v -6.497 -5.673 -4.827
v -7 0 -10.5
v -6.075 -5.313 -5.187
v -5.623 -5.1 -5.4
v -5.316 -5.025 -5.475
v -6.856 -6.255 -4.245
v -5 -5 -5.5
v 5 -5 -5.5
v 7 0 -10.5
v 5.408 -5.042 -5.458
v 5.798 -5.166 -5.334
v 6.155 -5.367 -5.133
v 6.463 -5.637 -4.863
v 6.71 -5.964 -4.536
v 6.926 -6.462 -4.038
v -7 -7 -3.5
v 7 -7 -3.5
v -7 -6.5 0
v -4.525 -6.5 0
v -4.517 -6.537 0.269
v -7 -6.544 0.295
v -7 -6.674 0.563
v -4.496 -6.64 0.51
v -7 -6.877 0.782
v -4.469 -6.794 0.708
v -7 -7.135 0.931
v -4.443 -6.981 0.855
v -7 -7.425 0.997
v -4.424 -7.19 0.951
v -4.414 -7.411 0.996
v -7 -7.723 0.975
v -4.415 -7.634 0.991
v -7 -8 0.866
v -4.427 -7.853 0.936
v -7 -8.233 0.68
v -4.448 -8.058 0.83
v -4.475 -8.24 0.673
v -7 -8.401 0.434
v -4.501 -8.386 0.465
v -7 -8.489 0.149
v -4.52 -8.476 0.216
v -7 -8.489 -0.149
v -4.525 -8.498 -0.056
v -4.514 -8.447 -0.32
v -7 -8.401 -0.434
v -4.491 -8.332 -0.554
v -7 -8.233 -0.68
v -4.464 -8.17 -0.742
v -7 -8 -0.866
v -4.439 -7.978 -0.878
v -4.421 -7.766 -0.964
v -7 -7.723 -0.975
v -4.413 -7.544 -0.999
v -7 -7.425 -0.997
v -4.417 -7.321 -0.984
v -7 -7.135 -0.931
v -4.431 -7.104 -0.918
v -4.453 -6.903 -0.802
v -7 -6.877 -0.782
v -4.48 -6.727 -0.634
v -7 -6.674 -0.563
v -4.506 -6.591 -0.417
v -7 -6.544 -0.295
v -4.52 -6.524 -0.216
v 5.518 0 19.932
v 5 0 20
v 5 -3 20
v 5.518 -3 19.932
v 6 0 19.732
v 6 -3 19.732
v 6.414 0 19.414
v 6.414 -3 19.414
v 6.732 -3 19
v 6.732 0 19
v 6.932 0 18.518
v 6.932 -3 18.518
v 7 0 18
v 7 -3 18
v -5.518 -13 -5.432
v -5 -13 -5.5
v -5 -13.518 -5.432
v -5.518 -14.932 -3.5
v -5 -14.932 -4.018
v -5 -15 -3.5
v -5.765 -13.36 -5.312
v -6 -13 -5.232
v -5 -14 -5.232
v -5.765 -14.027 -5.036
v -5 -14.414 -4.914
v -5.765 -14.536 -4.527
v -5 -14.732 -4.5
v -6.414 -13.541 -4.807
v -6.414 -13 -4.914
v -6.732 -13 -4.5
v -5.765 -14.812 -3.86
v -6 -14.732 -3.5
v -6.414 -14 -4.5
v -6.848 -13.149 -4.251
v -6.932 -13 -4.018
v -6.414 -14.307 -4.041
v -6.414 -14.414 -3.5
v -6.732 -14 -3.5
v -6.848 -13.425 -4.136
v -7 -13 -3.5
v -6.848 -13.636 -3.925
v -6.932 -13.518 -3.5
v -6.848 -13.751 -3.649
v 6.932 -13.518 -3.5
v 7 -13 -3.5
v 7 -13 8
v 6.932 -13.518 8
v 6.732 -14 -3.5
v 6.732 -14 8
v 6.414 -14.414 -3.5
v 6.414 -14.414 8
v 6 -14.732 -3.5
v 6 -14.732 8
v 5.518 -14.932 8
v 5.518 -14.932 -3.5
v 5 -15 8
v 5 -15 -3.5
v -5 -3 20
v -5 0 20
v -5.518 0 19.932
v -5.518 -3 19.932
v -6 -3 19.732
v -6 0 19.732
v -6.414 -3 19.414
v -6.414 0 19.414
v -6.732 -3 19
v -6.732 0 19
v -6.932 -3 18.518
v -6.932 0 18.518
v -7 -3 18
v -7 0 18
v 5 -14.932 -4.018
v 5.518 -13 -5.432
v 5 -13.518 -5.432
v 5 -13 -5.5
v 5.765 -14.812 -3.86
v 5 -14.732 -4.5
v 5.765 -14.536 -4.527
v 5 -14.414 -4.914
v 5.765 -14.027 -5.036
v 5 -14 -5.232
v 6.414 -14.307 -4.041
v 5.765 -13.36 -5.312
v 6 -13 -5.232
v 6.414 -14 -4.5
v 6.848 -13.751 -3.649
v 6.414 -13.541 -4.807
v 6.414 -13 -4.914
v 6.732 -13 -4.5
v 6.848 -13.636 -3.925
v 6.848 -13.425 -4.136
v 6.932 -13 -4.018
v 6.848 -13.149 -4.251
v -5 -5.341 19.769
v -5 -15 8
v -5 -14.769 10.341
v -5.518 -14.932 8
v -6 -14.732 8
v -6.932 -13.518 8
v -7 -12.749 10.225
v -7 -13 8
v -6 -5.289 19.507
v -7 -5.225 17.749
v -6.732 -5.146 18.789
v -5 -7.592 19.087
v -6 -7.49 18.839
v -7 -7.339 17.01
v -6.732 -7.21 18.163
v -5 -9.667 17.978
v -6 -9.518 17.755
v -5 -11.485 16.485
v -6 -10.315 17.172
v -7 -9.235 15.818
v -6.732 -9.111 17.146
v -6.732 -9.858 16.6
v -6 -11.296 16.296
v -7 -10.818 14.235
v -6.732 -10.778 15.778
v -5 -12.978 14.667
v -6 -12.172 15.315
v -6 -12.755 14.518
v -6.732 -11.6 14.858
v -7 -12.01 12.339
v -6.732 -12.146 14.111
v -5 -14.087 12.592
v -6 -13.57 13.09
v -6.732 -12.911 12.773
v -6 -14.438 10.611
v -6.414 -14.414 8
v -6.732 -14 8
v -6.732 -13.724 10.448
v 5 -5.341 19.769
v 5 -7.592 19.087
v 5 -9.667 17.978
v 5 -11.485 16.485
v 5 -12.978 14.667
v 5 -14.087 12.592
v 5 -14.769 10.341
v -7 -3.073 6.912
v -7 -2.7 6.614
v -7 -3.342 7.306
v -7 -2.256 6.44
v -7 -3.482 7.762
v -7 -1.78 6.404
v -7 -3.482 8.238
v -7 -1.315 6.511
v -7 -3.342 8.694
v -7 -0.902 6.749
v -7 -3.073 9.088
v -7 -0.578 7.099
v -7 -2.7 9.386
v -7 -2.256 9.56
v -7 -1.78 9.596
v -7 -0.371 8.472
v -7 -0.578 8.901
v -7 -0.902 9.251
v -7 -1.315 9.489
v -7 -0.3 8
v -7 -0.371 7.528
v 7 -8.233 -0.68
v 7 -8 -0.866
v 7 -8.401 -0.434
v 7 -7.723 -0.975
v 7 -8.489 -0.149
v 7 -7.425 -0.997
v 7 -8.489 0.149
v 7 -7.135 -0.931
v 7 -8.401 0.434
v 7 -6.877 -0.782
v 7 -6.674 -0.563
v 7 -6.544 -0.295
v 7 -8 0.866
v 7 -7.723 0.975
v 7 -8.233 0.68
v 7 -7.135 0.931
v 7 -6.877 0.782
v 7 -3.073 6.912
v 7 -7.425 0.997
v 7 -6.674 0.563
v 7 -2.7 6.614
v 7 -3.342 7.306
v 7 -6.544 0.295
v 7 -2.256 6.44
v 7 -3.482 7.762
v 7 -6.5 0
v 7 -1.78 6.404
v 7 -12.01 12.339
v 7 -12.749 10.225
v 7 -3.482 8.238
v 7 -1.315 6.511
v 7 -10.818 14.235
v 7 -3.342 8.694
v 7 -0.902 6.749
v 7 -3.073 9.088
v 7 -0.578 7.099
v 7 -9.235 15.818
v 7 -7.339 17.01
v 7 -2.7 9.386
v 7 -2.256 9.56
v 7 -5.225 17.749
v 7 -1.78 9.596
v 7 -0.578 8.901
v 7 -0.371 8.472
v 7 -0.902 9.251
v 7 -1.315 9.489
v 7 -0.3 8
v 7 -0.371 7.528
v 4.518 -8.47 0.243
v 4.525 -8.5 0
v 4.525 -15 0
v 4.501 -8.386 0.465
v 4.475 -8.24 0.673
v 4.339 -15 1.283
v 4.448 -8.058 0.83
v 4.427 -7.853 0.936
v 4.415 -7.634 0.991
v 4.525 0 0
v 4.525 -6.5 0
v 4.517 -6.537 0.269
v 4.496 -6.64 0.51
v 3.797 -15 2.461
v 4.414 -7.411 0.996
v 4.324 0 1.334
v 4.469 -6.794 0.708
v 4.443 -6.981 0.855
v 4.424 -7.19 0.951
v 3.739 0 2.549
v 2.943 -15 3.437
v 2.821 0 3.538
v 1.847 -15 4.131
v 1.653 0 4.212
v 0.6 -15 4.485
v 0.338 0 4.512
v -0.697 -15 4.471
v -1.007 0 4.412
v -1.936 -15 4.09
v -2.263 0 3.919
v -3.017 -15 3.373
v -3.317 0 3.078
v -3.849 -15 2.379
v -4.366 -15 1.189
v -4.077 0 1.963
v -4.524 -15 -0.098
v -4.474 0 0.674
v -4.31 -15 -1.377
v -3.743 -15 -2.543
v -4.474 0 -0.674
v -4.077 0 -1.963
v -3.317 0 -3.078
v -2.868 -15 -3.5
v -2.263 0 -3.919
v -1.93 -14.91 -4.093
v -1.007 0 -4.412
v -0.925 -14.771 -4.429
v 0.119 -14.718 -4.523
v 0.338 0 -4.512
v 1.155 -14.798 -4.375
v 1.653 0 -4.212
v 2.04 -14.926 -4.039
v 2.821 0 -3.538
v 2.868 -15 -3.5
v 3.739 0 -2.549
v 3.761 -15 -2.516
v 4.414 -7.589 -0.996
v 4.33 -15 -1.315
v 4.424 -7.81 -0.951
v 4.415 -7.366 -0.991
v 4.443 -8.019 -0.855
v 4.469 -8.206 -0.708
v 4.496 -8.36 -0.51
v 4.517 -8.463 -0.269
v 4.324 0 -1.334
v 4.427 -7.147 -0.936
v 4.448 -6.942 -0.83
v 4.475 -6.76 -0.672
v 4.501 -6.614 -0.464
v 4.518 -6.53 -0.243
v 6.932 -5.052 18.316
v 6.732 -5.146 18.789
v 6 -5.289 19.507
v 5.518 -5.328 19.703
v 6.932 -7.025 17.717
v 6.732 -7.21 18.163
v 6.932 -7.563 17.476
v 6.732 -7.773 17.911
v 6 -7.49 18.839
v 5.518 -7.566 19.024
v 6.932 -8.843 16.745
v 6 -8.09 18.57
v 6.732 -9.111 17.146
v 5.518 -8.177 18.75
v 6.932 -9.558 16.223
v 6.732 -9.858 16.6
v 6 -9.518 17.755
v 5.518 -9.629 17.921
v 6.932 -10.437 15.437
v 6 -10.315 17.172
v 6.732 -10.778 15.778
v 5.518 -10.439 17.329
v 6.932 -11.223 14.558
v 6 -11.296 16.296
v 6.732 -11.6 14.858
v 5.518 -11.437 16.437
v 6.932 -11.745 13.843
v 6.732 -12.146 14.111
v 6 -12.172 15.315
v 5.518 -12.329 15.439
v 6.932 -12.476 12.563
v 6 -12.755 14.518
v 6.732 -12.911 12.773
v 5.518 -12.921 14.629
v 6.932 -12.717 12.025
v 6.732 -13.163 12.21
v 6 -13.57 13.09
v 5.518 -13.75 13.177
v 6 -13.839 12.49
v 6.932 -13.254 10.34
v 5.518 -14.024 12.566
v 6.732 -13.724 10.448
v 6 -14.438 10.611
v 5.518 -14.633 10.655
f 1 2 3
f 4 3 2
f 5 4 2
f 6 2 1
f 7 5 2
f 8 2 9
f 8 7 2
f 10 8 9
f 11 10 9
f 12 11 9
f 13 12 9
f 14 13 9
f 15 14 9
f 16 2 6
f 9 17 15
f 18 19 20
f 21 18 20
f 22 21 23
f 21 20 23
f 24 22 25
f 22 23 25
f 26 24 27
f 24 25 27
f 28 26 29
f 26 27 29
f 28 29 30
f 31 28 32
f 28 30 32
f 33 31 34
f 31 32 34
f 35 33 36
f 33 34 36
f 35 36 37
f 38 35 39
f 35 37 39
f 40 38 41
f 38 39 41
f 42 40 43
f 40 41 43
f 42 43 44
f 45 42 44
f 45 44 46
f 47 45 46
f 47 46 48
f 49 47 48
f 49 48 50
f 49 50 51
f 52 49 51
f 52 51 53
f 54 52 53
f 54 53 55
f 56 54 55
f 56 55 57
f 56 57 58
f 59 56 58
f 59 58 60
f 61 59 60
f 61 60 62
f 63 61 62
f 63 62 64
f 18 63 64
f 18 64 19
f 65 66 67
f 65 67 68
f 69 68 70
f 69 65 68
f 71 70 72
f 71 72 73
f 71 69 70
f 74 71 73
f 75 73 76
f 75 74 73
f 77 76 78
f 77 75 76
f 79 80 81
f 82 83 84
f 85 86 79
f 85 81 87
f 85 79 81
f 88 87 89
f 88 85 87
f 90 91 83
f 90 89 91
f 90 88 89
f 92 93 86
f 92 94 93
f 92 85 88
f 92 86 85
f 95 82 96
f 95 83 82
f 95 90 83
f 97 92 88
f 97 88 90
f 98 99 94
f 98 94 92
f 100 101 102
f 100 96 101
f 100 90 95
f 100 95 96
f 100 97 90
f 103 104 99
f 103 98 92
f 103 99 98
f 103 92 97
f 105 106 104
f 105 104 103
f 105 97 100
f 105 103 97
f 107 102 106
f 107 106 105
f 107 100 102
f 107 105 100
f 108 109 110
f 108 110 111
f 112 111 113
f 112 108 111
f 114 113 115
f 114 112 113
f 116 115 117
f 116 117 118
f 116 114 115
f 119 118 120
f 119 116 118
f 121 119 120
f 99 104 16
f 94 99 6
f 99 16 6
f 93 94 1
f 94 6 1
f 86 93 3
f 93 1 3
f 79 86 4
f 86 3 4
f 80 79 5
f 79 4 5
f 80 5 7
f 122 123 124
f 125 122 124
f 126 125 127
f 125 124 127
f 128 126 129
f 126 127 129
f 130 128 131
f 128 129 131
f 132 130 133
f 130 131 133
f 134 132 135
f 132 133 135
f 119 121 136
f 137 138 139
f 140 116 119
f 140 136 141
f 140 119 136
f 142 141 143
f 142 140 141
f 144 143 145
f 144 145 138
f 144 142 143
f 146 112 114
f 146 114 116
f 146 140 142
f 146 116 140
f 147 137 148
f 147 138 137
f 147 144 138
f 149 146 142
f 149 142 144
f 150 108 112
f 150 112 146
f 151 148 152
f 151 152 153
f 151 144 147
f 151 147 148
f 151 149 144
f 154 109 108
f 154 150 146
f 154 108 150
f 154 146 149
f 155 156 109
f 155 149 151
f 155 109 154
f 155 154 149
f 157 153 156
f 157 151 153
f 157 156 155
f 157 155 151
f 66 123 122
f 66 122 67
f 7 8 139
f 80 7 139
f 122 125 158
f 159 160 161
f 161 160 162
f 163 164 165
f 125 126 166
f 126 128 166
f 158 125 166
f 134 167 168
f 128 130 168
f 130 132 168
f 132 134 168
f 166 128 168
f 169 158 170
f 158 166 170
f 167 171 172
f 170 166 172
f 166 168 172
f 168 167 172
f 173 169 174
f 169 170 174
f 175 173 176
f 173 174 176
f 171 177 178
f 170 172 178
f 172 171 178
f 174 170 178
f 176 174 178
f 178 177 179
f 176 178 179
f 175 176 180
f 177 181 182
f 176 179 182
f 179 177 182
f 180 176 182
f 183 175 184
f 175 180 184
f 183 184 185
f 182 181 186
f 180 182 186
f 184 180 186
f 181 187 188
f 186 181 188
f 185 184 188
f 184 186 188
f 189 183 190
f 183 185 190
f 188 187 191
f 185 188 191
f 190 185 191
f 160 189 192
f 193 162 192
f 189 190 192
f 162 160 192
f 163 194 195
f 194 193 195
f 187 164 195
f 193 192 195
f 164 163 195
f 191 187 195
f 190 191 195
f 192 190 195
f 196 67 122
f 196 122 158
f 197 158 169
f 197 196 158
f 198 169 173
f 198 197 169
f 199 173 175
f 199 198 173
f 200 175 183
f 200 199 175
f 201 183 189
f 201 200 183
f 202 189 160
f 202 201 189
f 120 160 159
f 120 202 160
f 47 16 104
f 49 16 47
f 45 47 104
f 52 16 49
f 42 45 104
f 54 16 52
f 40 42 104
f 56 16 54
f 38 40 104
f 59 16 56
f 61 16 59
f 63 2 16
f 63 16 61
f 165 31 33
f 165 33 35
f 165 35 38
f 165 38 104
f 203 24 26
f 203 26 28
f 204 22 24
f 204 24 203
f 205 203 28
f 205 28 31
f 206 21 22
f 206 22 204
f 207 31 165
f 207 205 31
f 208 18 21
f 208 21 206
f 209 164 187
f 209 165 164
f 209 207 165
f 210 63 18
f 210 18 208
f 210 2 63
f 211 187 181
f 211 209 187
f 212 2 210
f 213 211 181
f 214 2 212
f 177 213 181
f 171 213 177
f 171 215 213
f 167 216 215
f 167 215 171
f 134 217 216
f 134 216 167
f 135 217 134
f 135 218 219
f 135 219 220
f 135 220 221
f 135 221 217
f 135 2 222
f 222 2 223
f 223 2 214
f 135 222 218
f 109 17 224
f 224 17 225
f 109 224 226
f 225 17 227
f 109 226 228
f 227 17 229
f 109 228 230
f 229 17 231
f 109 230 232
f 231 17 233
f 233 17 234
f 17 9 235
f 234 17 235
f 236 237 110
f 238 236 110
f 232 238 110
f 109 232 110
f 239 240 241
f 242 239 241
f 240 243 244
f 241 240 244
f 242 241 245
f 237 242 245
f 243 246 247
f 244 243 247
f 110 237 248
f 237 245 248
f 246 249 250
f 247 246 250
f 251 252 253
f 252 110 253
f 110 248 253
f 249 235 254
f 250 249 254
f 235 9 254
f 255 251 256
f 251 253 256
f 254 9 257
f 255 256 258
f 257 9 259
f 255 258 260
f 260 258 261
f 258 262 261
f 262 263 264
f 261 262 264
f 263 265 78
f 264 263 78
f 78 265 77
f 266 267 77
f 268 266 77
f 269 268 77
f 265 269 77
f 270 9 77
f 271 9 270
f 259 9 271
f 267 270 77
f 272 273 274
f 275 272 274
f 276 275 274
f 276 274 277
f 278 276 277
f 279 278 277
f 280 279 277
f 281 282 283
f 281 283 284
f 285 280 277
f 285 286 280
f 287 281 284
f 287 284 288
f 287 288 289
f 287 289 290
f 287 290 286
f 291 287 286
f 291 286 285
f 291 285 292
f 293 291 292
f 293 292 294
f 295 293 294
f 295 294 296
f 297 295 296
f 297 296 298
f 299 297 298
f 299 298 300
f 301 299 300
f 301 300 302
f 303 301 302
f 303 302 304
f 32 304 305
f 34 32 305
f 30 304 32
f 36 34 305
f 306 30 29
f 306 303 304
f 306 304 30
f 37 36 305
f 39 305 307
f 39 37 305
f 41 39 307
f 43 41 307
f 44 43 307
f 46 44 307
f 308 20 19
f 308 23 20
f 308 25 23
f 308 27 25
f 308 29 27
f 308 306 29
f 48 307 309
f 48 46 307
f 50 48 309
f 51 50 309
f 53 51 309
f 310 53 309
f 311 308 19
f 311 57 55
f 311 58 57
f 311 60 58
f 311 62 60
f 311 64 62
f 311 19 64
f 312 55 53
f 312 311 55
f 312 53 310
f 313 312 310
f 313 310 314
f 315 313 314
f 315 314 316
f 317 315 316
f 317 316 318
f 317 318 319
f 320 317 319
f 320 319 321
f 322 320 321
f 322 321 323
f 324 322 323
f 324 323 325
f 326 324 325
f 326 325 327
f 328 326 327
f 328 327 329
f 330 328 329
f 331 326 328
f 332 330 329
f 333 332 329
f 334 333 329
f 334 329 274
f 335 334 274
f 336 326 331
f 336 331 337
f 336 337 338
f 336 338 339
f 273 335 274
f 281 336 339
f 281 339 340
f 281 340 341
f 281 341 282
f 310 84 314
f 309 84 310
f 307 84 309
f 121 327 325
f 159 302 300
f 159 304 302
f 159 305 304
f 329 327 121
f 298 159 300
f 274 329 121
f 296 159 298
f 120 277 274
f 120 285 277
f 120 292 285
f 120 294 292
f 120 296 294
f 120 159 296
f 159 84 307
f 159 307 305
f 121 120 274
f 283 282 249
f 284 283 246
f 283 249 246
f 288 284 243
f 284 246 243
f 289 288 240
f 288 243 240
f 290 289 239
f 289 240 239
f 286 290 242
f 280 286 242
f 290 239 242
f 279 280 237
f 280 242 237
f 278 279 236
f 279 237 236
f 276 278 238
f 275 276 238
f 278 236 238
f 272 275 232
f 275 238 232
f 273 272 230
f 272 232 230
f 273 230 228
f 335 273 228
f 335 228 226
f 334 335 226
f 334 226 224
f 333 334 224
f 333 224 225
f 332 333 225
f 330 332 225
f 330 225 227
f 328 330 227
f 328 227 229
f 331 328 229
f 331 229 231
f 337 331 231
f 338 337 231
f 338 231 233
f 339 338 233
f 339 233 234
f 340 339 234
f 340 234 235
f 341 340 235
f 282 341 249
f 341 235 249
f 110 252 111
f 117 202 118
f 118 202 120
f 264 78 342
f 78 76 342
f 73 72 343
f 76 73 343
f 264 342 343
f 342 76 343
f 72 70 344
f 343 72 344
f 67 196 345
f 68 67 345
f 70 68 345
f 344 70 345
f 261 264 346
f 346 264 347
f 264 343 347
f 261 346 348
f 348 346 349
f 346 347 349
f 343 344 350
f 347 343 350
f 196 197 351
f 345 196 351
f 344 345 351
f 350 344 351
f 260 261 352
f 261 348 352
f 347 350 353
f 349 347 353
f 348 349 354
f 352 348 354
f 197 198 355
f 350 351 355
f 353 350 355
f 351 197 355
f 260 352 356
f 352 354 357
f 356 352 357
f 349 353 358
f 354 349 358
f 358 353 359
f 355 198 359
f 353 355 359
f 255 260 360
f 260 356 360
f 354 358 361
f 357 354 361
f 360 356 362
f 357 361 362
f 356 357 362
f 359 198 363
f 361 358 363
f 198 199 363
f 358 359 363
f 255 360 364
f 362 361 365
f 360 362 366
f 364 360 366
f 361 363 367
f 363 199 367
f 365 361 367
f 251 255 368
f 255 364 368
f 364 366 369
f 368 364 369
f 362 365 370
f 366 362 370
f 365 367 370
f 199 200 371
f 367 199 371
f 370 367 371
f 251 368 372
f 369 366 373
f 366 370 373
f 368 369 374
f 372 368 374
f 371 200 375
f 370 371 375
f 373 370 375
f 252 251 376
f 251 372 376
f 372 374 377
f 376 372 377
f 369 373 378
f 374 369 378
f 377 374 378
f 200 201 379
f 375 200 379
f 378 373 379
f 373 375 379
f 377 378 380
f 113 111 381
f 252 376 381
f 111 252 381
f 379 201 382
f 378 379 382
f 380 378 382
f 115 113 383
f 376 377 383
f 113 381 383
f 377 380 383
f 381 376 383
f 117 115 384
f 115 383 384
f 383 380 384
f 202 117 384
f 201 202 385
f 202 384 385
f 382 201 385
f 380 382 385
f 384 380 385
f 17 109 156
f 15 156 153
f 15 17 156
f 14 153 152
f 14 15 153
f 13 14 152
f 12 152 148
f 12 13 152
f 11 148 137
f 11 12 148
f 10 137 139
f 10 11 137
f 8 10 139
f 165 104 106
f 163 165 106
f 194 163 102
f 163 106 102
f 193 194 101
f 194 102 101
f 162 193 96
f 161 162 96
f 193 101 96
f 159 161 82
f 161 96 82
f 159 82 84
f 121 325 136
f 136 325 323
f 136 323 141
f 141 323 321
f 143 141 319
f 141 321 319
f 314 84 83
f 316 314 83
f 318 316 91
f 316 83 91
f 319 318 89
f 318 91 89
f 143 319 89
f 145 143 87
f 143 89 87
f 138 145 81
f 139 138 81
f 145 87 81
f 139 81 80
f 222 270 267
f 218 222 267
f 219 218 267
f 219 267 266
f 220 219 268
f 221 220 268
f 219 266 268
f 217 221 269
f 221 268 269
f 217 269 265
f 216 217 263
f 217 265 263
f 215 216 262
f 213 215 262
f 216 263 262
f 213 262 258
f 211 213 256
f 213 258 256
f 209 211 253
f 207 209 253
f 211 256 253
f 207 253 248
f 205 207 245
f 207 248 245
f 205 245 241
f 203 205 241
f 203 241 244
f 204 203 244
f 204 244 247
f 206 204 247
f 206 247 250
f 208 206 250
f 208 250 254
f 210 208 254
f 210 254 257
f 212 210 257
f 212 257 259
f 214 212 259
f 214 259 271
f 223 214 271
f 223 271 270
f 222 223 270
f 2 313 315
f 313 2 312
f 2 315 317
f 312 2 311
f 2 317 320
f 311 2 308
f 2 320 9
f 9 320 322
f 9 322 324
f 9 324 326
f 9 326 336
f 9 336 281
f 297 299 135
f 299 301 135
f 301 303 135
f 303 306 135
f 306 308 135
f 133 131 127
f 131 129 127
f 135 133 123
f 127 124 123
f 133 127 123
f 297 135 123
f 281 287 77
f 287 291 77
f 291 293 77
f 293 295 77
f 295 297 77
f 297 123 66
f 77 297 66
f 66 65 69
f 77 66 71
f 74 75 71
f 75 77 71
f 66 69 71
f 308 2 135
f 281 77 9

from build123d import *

# Parameters (mm, degrees)
F0_W         = 14
F0_H         = 30.5
F0_R         = 4.525
F1_DEPTH     = 15
F3_DEPTH     = 14.001
F4_R         = 1.6
F4_R_2       = 1
F5_DEPTH     = 14.001
F6_R         = 12
F7_T1_DEPTH  = 10
F7_T3_DEPTH  = 11.5
F7_T5_DEPTH  = 8
F7_S9_W      = 2
F7_S9_H      = 2
F7_T10_DEPTH = 2
F7_S15_W     = 2
F7_S15_H     = 2
F7_T16_DEPTH = 2
F7_T22_DEPTH = 13
F7_T25_ANGLE = 90
F7_T29_DEPTH = 13
F7_T32_ANGLE = 90


# Not quite as in the source:
# - a fillet or chamfer that OpenCascade refuses, or shapes differently, is made with other operations: its cross-section is extruded or revolved along the edge and cut away or added


with BuildPart() as f1:
    # F0 (on Front) → F1 (new body)
    with BuildSketch(Plane.XZ):
        with Locations((0, 4.75)):
            Rectangle(F0_W, F0_H)
        Circle(F0_R, mode=Mode.SUBTRACT)
    extrude(amount=F1_DEPTH)

    # F2 (on face) → F3 (cut, through all)
    with BuildSketch(Plane.YZ.offset(7)):
        Polygon((-15, -10.5), (0, -10.5), (-5, -5.5), (-15, -5.5), align=None)
    extrude(amount=-F3_DEPTH, mode=Mode.SUBTRACT)

    # F4 (on face) → F5 (cut, through all)
    with BuildSketch(Plane.YZ.offset(7)):
        with Locations((-1.9, 8)):
            Circle(F4_R)
        with Locations((-7.5, 0)):
            Circle(F4_R_2)
    extrude(amount=-F5_DEPTH, mode=Mode.SUBTRACT)

    # F6
    f6_edges = [f1.edges().sort_by_distance(p)[0] for p in [
        (0, -15, 20),
    ]]
    fillet(f6_edges, radius=F6_R)

    # F7: fillet of radius 2 on 9 edges, made by hand

    # F7_s2 → F7_t1 (cut)
    with BuildSketch(Plane.YZ.offset(-5)):
        with BuildLine():
            ThreePointArc((-15, -3.5), (-14.4142135624, -4.9142135624), (-13, -5.5))
            Line((-13, -5.5), (-15, -5.5))
            Line((-15, -5.5), (-15, -3.5))
        make_face()
    extrude(amount=F7_T1_DEPTH, mode=Mode.SUBTRACT)

    # F7_s4 → F7_t3 (cut)
    with BuildSketch(Plane.XY.offset(-3.5)):
        with BuildLine():
            ThreePointArc((7, -13), (6.4142135624, -14.4142135624), (5, -15))
            Line((5, -15), (7, -15))
            Line((7, -15), (7, -13))
        make_face()
        with BuildLine():
            ThreePointArc((-7, -13), (-6.4142135624, -14.4142135624), (-5, -15))
            Line((-5, -15), (-7, -15))
            Line((-7, -15), (-7, -13))
        make_face()
    extrude(amount=F7_T3_DEPTH, mode=Mode.SUBTRACT)

    # F7_s6 → F7_t5 (cut)
    with BuildSketch(Plane.XZ.offset(-5)):
        with BuildLine():
            ThreePointArc((5, 20), (6.4142135624, 19.4142135624), (7, 18))
            Line((7, 18), (7, 20))
            Line((7, 20), (5, 20))
        make_face()
        with BuildLine():
            ThreePointArc((-5, 20), (-6.4142135624, 19.4142135624), (-7, 18))
            Line((-7, 18), (-7, 20))
            Line((-7, 20), (-5, 20))
        make_face()
    extrude(amount=F7_T5_DEPTH, mode=Mode.SUBTRACT)


with BuildPart() as f7_tool8:
    # F7_s9 → F7_t10 (new body)
    with BuildSketch(Plane.YZ.offset(5)):
        with Locations((-14, -4.5)):
            Rectangle(F7_S9_W, F7_S9_H)
    extrude(amount=F7_T10_DEPTH)

    # F7_s11 → F7_t12 (revolve, cut)
    with BuildSketch(Plane(origin=(5, -13, -3.5), x_dir=(0, 0.7071067812, 0.7071067812), z_dir=(0, 0.7071067812, -0.7071067812))):
        with BuildLine():
            ThreePointArc((0, -2), (2, 0), (0, 2))
            Line((0, 2), (0, -2))
        make_face()
    revolve(axis=Axis((5, -13, -3.5), (1, 0, 0)), mode=Mode.SUBTRACT)


with BuildPart() as f1_1:
    add(f1.part)

    # F7_t7: cut F7_tool8
    add(f7_tool8.part, mode=Mode.SUBTRACT)


with BuildPart() as f7_tool14:
    # F7_s15 → F7_t16 (new body)
    with BuildSketch(Plane.YZ.offset(-5)):
        with Locations((-14, -4.5)):
            Rectangle(F7_S15_W, F7_S15_H)
    extrude(amount=-F7_T16_DEPTH)

    # F7_s17 → F7_t18 (revolve, cut)
    with BuildSketch(Plane(origin=(-5, -13, -3.5), x_dir=(0, 0.7071067812, 0.7071067812), z_dir=(0, -0.7071067812, 0.7071067812))):
        with BuildLine():
            ThreePointArc((0, -2), (2, 0), (0, 2))
            Line((0, 2), (0, -2))
        make_face()
    revolve(axis=Axis((-5, -13, -3.5), (-1, 0, 0)), mode=Mode.SUBTRACT)


with BuildPart() as f1_2:
    add(f1_1.part)

    # F7_t13: cut F7_tool14
    add(f7_tool14.part, mode=Mode.SUBTRACT)


with BuildPart() as f7_tool20:
    # F7_s21 → F7_t22 (new body)
    with BuildSketch(Plane.XZ):
        with BuildLine():
            ThreePointArc((-7, -3.5), (-6.4142135624, -4.9142135624), (-5, -5.5))
            Line((-5, -5.5), (-7, -5.5))
            Line((-7, -5.5), (-7, -3.5))
        make_face()
    extrude(amount=F7_T22_DEPTH)

    split(bisect_by=Plane(origin=(0, -5.25, -5.25), x_dir=(1, 0, 0), z_dir=(0, -0.7071067812, -0.7071067812)), keep=Keep.TOP)


with BuildPart() as f1_3:
    add(f1_2.part)

    # F7_t19: cut F7_tool20
    add(f7_tool20.part, mode=Mode.SUBTRACT)

    # F7_s24 → F7_t25 (revolve, cut)
    with BuildSketch(Plane.XZ.offset(3)):
        with BuildLine():
            ThreePointArc((-5, 20), (-6.4142135624, 19.4142135624), (-7, 18))
            Line((-7, 18), (-7, 20))
            Line((-7, 20), (-5, 20))
        make_face()
    revolve(axis=Axis((-7, -3, 8), (1, 0, 0)), revolution_arc=F7_T25_ANGLE, mode=Mode.SUBTRACT)


with BuildPart() as f7_tool27:
    # F7_s28 → F7_t29 (new body)
    with BuildSketch(Plane.XZ):
        with BuildLine():
            ThreePointArc((7, -3.5), (6.4142135624, -4.9142135624), (5, -5.5))
            Line((5, -5.5), (7, -5.5))
            Line((7, -5.5), (7, -3.5))
        make_face()
    extrude(amount=F7_T29_DEPTH)

    split(bisect_by=Plane(origin=(0, -5.25, -5.25), x_dir=(1, 0, 0), z_dir=(0, -0.7071067812, -0.7071067812)), keep=Keep.TOP)


with BuildPart() as f1_4:
    add(f1_3.part)

    # F7_t26: cut F7_tool27
    add(f7_tool27.part, mode=Mode.SUBTRACT)

    # F7_s31 → F7_t32 (revolve, cut)
    with BuildSketch(Plane.XZ.offset(3)):
        with BuildLine():
            ThreePointArc((7, 18), (6.4142135624, 19.4142135624), (5, 20))
            Line((5, 20), (7, 20))
            Line((7, 20), (7, 18))
        make_face()
    revolve(axis=Axis((7, -3, 8), (1, 0, 0)), revolution_arc=F7_T32_ANGLE, mode=Mode.SUBTRACT)


solid = f1_4.part
